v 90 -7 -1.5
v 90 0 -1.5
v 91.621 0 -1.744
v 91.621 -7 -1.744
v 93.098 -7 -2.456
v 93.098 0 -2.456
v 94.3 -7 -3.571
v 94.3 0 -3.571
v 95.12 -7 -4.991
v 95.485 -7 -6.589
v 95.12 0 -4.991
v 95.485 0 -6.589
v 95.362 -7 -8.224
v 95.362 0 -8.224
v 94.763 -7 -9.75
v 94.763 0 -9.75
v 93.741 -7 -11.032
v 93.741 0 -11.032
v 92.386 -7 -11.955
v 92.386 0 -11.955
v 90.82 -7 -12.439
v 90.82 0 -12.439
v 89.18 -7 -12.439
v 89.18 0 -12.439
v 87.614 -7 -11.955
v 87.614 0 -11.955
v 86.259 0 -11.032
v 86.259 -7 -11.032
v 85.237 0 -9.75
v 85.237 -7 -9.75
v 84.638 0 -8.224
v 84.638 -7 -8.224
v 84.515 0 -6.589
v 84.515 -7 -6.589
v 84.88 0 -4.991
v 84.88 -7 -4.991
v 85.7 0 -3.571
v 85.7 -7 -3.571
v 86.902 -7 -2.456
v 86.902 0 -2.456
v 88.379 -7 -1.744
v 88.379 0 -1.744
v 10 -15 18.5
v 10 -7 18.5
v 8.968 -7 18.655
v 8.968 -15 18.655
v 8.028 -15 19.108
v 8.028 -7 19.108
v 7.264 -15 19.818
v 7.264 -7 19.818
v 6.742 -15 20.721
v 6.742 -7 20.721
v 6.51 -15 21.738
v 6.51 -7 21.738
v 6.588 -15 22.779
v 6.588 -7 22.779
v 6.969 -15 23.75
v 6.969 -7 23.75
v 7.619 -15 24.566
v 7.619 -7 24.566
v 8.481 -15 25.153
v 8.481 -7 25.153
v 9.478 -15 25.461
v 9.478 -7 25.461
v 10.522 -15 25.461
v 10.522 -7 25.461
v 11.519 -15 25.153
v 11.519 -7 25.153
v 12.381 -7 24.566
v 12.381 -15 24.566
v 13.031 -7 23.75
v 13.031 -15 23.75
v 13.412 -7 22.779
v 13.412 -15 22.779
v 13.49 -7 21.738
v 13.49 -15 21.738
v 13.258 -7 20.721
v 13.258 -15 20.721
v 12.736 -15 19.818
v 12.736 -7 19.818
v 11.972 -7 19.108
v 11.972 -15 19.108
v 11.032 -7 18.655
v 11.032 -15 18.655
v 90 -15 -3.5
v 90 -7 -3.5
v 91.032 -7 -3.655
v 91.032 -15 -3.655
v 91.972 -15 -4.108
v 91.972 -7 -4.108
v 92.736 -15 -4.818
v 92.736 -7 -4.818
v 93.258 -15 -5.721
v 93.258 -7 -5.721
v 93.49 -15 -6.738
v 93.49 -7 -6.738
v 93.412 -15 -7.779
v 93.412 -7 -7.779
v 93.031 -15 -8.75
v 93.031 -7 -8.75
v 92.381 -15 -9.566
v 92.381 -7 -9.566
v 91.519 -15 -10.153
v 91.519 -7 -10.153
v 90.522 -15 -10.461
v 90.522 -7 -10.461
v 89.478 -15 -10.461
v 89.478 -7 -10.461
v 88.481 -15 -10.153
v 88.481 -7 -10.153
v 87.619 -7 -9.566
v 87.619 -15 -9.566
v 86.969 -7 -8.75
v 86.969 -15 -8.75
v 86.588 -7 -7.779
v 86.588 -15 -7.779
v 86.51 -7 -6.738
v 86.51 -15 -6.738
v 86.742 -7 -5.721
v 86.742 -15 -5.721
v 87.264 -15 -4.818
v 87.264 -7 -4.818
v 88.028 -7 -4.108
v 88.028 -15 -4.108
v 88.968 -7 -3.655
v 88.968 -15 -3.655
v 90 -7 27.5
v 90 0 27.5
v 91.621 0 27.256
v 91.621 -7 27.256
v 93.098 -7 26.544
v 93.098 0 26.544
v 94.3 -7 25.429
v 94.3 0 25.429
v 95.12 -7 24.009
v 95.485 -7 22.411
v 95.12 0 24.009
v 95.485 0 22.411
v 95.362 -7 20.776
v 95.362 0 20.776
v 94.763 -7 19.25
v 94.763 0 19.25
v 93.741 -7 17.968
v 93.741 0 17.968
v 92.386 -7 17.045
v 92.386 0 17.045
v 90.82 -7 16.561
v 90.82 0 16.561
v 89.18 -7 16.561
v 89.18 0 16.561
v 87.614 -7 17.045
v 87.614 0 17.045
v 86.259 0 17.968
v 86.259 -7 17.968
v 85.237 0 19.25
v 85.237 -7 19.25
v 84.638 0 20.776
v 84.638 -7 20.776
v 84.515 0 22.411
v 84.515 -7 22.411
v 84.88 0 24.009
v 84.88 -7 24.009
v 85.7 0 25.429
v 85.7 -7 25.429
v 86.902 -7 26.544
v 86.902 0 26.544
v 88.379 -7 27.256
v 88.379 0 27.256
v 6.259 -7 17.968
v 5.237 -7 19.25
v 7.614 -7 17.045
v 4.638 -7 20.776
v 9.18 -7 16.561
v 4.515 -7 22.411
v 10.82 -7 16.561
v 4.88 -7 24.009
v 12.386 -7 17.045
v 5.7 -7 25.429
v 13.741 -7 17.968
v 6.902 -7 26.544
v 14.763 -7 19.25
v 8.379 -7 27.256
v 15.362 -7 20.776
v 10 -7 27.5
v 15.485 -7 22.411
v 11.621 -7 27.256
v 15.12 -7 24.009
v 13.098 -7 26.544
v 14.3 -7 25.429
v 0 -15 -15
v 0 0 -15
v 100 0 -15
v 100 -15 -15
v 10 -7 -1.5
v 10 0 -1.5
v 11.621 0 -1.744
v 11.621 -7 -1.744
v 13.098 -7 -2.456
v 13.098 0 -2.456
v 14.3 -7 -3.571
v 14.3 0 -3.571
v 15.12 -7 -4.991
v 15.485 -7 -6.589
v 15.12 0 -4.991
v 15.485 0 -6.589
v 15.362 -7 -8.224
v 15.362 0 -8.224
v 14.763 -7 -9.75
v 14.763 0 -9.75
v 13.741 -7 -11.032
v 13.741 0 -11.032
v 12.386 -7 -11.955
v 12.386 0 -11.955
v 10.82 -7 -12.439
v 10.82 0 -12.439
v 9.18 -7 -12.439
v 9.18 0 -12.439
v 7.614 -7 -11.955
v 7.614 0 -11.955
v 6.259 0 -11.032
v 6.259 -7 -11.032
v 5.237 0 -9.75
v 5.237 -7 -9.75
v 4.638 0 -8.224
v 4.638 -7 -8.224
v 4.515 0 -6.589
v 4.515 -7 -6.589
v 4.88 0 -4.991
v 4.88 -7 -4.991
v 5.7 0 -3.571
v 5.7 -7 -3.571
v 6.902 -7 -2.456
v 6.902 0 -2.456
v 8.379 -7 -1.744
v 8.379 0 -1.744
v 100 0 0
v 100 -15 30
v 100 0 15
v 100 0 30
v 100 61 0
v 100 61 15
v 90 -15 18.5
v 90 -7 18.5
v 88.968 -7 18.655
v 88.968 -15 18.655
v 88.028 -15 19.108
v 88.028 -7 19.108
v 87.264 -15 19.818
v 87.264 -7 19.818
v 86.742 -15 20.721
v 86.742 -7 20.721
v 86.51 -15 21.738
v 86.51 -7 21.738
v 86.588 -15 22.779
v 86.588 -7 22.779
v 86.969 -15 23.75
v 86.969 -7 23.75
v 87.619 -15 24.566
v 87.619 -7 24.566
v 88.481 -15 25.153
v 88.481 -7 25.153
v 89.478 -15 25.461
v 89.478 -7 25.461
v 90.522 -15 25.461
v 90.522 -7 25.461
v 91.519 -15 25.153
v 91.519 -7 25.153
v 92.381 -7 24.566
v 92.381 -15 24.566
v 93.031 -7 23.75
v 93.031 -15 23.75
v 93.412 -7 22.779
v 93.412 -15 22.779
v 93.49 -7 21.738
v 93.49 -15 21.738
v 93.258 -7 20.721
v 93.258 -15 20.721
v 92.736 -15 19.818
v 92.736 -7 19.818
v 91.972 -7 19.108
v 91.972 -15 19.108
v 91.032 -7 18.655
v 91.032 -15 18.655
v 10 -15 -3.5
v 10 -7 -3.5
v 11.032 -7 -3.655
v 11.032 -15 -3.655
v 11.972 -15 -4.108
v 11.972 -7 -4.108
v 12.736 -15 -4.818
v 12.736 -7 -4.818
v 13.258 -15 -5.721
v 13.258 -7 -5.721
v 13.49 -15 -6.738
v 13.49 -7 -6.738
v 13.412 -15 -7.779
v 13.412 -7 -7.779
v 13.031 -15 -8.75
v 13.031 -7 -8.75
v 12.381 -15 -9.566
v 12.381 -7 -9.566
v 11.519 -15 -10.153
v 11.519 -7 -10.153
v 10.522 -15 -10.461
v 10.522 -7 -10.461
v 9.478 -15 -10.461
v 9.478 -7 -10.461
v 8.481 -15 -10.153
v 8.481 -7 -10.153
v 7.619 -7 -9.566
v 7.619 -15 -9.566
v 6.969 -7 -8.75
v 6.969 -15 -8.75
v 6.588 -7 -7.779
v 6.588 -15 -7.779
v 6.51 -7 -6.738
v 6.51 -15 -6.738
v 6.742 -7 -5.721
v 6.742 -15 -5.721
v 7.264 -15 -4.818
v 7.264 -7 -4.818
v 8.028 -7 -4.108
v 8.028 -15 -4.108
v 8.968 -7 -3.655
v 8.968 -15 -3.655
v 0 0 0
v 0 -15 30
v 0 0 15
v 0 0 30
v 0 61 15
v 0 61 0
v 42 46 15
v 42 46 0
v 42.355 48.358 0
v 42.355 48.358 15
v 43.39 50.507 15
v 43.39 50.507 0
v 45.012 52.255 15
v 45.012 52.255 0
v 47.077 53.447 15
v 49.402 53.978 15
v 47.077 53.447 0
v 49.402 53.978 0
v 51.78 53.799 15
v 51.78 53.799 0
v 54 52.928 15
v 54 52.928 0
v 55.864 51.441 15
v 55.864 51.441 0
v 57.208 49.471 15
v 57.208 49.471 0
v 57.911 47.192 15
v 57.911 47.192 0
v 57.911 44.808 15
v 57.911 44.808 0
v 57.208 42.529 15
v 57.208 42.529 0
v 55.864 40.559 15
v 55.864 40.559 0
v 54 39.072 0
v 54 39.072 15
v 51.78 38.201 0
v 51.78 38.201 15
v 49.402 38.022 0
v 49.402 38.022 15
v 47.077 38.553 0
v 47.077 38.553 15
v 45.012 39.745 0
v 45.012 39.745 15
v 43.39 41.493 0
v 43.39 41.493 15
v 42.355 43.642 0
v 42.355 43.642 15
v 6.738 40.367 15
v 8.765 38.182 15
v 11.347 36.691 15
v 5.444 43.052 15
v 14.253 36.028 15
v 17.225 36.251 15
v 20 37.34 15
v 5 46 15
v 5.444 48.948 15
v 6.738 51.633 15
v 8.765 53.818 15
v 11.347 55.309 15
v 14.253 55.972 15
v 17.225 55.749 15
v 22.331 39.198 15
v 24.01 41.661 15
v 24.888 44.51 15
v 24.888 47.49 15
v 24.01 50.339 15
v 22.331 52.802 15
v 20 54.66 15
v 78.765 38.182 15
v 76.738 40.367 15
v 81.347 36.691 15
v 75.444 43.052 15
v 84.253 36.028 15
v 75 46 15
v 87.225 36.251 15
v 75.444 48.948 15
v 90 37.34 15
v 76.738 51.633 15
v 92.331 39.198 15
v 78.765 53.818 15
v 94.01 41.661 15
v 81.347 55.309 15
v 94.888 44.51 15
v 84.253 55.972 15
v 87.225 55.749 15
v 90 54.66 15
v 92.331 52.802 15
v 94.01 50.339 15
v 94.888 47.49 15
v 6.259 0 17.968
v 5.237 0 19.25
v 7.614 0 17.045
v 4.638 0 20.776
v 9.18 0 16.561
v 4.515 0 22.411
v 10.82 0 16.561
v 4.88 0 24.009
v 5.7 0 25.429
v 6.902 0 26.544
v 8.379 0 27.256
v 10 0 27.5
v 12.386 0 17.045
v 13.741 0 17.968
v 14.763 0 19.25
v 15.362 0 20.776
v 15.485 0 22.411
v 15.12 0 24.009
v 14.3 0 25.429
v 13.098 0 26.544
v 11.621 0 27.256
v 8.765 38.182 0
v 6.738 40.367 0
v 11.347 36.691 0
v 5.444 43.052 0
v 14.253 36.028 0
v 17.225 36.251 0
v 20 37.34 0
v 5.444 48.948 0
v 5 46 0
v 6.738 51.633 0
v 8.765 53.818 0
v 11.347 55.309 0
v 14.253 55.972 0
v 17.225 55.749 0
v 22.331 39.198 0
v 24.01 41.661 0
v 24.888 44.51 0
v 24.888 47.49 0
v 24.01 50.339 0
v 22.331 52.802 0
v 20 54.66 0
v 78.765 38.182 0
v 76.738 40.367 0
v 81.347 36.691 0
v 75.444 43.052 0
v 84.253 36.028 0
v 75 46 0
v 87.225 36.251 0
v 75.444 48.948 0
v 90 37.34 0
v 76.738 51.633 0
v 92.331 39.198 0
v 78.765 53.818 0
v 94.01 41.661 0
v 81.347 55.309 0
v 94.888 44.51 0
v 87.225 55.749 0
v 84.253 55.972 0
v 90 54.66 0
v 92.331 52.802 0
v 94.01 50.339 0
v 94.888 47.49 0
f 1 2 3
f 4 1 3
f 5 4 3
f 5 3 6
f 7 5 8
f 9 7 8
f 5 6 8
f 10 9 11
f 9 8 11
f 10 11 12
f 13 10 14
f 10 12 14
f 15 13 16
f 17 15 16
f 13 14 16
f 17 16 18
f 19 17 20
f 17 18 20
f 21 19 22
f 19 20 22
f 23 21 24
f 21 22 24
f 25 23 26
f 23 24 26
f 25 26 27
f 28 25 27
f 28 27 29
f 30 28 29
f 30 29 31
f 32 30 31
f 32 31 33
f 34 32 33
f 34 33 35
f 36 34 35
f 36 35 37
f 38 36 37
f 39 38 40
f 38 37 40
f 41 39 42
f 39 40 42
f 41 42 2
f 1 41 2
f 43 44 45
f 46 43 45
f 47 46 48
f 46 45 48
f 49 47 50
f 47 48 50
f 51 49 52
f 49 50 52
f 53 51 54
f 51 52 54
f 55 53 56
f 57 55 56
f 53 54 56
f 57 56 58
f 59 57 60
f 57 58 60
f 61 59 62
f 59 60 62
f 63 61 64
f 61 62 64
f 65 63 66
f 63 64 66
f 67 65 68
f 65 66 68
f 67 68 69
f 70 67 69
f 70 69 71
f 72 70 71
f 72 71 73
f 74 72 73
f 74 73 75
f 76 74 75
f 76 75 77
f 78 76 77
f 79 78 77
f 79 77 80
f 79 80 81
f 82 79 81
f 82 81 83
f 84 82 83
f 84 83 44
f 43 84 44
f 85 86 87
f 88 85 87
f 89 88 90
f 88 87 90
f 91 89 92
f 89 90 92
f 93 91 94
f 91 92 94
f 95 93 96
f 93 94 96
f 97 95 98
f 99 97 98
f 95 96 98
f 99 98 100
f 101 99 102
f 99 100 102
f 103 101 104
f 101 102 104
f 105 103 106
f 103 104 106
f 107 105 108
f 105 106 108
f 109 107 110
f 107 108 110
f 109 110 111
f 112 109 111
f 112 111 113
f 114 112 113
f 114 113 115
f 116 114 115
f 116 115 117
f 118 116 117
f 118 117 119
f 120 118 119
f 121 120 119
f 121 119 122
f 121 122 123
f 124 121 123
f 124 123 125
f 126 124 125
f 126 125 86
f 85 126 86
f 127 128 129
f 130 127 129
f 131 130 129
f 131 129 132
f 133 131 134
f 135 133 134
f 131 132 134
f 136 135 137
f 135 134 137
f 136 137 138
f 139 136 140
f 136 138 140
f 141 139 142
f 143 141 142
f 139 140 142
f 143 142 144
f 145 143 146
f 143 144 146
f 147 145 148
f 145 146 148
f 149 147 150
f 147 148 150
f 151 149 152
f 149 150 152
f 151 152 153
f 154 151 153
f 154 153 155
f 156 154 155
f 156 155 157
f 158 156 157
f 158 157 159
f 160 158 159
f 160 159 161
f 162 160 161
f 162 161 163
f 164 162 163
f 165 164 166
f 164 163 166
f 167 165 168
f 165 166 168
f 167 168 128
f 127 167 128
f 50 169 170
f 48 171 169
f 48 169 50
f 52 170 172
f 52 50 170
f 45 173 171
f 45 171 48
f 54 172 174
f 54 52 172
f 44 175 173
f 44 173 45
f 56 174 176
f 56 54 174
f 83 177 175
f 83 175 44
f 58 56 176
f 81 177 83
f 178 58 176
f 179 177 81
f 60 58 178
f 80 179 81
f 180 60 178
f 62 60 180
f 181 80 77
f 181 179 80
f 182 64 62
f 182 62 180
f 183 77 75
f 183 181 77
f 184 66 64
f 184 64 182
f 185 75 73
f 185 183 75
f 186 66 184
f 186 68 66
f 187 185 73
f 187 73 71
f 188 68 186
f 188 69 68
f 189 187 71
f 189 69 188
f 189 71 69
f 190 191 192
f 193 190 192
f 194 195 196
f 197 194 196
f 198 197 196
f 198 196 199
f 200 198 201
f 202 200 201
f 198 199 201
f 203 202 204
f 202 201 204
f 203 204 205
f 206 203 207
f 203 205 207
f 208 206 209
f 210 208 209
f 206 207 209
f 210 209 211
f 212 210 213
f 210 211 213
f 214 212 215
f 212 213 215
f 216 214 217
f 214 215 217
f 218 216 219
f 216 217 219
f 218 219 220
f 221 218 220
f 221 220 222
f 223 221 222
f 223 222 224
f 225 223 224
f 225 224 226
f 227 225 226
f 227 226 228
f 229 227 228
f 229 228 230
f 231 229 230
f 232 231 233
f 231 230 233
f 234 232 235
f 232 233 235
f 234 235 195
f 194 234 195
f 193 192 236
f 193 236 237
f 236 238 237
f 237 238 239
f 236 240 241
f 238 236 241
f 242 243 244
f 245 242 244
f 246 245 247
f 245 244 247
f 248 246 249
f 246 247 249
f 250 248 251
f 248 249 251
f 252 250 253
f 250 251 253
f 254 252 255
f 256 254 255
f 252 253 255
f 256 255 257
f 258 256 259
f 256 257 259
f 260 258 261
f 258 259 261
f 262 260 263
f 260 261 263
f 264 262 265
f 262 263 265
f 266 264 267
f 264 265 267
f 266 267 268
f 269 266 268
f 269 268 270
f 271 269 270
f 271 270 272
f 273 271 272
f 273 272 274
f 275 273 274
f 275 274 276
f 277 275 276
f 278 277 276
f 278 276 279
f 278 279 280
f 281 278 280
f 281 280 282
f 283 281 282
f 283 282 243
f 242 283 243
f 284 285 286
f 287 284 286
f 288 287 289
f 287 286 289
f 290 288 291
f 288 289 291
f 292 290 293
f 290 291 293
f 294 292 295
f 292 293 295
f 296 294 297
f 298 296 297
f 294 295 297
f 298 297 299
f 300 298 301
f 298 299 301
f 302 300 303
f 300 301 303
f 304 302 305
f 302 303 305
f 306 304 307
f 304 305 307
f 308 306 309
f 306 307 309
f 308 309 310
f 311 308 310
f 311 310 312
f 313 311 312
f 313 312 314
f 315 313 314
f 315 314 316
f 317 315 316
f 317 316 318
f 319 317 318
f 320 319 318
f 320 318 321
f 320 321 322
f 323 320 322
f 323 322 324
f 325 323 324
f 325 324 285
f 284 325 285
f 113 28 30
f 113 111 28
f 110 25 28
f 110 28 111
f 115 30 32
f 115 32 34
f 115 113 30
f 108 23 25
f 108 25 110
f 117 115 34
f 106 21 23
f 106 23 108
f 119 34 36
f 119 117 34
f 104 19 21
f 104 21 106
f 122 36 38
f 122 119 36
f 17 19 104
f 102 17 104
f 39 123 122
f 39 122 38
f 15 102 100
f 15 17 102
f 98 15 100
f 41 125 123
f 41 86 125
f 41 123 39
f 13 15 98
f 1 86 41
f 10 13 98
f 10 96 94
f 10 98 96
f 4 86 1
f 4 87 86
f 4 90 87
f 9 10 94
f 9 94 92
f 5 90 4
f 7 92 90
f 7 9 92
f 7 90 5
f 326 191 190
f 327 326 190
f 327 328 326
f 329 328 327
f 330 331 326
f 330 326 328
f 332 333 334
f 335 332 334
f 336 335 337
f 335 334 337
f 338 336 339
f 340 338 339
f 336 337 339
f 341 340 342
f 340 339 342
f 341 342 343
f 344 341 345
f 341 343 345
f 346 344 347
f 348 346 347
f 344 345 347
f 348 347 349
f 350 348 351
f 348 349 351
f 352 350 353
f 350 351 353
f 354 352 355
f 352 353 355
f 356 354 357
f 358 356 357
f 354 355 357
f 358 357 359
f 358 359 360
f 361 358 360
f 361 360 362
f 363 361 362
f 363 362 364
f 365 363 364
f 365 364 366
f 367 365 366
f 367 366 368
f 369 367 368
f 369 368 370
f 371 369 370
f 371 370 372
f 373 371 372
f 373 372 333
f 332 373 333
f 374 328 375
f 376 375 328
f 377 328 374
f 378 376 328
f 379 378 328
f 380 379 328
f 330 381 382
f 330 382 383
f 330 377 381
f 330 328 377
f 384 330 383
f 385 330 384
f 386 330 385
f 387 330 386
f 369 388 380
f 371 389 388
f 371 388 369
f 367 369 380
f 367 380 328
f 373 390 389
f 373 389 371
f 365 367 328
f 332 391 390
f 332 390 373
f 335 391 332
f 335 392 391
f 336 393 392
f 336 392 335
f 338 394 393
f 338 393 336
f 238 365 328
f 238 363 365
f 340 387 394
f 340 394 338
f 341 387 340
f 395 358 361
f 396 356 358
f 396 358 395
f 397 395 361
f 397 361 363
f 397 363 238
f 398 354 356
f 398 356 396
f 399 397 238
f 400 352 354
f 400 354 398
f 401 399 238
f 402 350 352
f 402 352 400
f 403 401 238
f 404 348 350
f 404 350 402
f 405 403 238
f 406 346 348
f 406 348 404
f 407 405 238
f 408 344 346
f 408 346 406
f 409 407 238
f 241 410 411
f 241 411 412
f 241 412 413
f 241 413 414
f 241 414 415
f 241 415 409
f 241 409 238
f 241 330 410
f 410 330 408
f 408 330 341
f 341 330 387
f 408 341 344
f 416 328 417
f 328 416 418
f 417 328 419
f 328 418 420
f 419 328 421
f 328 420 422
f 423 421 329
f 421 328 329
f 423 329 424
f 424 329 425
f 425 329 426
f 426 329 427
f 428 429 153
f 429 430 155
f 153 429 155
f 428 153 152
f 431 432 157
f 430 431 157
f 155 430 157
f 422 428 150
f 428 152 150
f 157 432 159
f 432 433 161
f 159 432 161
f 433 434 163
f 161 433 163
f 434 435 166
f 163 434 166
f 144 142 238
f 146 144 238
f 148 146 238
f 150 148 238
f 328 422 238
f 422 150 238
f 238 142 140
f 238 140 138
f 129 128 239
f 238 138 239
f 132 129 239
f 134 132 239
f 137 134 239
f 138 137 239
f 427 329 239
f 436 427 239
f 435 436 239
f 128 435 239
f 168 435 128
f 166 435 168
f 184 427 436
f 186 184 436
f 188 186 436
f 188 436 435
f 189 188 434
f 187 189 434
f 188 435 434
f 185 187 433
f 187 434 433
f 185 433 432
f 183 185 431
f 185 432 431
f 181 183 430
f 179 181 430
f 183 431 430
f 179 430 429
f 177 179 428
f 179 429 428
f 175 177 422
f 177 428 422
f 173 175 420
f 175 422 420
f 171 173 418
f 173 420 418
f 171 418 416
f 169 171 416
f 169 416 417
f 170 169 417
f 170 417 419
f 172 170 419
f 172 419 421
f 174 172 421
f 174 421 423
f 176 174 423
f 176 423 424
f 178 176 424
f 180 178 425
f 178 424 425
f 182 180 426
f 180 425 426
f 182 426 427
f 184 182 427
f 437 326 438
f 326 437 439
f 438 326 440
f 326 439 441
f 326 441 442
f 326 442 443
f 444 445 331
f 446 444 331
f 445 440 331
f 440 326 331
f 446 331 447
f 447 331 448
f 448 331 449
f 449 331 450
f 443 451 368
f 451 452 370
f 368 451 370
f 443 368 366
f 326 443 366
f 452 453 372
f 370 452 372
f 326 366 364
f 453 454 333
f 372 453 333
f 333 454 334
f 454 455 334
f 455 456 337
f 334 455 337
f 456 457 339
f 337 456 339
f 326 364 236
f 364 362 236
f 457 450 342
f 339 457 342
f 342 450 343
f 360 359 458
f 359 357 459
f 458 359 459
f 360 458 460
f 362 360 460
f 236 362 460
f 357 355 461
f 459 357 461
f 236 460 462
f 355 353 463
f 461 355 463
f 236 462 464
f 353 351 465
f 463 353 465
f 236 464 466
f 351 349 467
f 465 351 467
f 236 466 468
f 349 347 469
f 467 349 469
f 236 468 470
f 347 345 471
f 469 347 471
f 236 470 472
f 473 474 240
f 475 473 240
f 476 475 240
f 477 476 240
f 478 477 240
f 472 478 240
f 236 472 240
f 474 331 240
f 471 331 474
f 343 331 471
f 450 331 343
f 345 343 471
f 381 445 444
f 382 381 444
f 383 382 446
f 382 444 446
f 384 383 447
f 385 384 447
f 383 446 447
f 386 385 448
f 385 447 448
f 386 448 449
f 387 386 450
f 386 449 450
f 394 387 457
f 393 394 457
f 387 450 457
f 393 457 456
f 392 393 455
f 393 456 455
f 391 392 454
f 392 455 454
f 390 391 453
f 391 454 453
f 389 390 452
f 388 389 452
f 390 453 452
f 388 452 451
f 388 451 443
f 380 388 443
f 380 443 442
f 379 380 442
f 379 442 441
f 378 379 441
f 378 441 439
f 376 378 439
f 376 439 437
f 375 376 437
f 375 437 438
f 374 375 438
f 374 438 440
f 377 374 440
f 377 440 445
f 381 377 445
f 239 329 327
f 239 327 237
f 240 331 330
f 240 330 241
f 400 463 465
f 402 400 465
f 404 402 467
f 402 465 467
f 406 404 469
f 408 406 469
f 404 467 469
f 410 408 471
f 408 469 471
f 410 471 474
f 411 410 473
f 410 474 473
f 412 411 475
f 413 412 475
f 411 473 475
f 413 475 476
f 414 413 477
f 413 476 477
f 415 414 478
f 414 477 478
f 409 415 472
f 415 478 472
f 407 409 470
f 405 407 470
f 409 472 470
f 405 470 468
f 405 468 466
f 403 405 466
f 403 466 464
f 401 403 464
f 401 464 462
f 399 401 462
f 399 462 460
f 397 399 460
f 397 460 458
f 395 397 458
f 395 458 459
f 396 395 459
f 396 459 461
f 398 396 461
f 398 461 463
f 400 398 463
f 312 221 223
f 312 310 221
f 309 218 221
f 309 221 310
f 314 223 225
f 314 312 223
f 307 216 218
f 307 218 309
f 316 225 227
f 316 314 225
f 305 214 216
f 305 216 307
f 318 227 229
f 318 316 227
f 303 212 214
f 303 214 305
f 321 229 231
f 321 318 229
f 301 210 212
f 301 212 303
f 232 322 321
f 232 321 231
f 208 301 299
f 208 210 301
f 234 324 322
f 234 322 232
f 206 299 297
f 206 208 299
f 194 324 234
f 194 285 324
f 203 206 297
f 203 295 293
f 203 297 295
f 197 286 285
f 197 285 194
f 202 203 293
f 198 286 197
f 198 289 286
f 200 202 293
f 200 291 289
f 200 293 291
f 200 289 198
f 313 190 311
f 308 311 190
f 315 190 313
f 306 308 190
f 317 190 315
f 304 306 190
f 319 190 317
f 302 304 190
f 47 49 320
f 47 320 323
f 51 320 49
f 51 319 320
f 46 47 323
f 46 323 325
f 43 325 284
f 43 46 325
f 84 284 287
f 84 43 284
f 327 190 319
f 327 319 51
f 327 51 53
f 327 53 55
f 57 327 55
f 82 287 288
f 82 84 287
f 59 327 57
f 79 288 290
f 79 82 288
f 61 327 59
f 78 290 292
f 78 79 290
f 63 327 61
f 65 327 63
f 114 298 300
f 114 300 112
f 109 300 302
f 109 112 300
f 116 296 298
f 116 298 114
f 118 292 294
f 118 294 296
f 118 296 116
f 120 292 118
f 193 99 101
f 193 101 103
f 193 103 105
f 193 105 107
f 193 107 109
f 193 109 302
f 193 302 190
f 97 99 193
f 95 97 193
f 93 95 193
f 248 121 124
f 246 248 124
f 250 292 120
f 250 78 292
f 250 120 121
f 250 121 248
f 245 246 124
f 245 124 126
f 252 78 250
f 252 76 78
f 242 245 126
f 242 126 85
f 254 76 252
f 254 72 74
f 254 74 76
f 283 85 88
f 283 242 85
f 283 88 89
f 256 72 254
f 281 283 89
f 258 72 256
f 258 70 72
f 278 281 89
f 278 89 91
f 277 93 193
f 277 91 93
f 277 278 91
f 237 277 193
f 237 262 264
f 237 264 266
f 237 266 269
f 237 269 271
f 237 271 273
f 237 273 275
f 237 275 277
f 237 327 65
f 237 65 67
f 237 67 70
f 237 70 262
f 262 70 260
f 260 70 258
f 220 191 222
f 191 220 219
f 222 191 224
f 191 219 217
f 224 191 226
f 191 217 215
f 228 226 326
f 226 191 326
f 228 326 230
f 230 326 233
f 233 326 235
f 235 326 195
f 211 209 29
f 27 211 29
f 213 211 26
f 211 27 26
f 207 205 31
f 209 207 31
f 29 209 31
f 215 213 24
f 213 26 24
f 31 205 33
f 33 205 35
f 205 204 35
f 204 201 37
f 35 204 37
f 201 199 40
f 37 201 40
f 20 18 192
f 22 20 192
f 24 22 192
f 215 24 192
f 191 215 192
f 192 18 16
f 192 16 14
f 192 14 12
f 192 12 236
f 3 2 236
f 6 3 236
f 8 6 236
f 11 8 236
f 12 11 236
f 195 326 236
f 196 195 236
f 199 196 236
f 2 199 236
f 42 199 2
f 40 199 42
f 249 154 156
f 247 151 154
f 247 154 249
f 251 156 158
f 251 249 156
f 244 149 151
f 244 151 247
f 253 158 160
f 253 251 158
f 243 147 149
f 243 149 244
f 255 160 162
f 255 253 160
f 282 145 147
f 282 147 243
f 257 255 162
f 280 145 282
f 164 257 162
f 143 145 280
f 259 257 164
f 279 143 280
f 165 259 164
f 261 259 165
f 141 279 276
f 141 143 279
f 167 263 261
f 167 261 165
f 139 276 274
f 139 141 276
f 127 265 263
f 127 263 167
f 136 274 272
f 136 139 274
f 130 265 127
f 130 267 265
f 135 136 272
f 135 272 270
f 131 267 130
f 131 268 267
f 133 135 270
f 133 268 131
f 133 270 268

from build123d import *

# Parameters (mm, degrees)
SKETCH_1_W          = 100
SKETCH_1_H          = 61
EXTRUDE_1_DEPTH     = 15
SKETCH_2_W          = 100
SKETCH_2_H          = 45
EXTRUDE_2_DEPTH     = 15
SKETCH_3_R          = 3.5
CUT_EXTRUDE_1_DEPTH = 121.917327129
SKETCH_4_R          = 5.5
CUT_EXTRUDE_2_DEPTH = 7
SKETCH_5_R          = 10
SKETCH_5_R_2        = 8
CUT_EXTRUDE_3_DEPTH = 121.917327129


with BuildPart() as part:
    # 草图1 → 凸台-拉伸1 (new body)
    with BuildSketch(Plane.XY):
        with Locations((50, 30.5)):
            Rectangle(SKETCH_1_W, SKETCH_1_H)
    extrude(amount=EXTRUDE_1_DEPTH)

    # 草图2 → 凸台-拉伸2 (add)
    with BuildSketch(Plane.XZ):
        with Locations((50, 7.5)):
            Rectangle(SKETCH_2_W, SKETCH_2_H)
    extrude(amount=EXTRUDE_2_DEPTH)

    # 草图3 → 切除-拉伸1 (cut, through all)
    with BuildSketch(Plane(origin=(0, 0, 0), x_dir=(1, 0, 0), z_dir=(0, 1, 0))):
        with Locations(Location((10, 7, 0), (0, 0, 270))):
            Circle(SKETCH_3_R)
        with Locations(Location((90, 7, 0), (0, 0, 270))):
            Circle(SKETCH_3_R)
        with Locations(Location((90, -22, 0), (0, 0, 90))):
            Circle(SKETCH_3_R)
        with Locations(Location((10, -22, 0), (0, 0, 90))):
            Circle(SKETCH_3_R)
    extrude(amount=-CUT_EXTRUDE_1_DEPTH, mode=Mode.SUBTRACT)

    # 草图4 → 切除-拉伸2 (cut)
    with BuildSketch(Plane(origin=(0, 0, 0), x_dir=(1, 0, 0), z_dir=(0, 1, 0))):
        with Locations(Location((10, 7, 0), (0, 0, 270))):
            Circle(SKETCH_4_R)
        with Locations(Location((90, 7, 0), (0, 0, 270))):
            Circle(SKETCH_4_R)
        with Locations(Location((10, -22, 0), (0, 0, 270))):
            Circle(SKETCH_4_R)
        with Locations(Location((90, -22, 0), (0, 0, 270))):
            Circle(SKETCH_4_R)
    extrude(amount=-CUT_EXTRUDE_2_DEPTH, mode=Mode.SUBTRACT)

    # 草图5 → 切除-拉伸3 (cut, through all)
    with BuildSketch(Plane(origin=(0, 0, 0), x_dir=(-1, 0, 0), z_dir=(0, 0, -1))):
        with Locations((-85, 46)):
            Circle(SKETCH_5_R)
        with Locations((-15, 46)):
            Circle(SKETCH_5_R)
        with Locations((-50, 46)):
            Circle(SKETCH_5_R_2)
    extrude(amount=-CUT_EXTRUDE_3_DEPTH, mode=Mode.SUBTRACT)


solid = part.part
